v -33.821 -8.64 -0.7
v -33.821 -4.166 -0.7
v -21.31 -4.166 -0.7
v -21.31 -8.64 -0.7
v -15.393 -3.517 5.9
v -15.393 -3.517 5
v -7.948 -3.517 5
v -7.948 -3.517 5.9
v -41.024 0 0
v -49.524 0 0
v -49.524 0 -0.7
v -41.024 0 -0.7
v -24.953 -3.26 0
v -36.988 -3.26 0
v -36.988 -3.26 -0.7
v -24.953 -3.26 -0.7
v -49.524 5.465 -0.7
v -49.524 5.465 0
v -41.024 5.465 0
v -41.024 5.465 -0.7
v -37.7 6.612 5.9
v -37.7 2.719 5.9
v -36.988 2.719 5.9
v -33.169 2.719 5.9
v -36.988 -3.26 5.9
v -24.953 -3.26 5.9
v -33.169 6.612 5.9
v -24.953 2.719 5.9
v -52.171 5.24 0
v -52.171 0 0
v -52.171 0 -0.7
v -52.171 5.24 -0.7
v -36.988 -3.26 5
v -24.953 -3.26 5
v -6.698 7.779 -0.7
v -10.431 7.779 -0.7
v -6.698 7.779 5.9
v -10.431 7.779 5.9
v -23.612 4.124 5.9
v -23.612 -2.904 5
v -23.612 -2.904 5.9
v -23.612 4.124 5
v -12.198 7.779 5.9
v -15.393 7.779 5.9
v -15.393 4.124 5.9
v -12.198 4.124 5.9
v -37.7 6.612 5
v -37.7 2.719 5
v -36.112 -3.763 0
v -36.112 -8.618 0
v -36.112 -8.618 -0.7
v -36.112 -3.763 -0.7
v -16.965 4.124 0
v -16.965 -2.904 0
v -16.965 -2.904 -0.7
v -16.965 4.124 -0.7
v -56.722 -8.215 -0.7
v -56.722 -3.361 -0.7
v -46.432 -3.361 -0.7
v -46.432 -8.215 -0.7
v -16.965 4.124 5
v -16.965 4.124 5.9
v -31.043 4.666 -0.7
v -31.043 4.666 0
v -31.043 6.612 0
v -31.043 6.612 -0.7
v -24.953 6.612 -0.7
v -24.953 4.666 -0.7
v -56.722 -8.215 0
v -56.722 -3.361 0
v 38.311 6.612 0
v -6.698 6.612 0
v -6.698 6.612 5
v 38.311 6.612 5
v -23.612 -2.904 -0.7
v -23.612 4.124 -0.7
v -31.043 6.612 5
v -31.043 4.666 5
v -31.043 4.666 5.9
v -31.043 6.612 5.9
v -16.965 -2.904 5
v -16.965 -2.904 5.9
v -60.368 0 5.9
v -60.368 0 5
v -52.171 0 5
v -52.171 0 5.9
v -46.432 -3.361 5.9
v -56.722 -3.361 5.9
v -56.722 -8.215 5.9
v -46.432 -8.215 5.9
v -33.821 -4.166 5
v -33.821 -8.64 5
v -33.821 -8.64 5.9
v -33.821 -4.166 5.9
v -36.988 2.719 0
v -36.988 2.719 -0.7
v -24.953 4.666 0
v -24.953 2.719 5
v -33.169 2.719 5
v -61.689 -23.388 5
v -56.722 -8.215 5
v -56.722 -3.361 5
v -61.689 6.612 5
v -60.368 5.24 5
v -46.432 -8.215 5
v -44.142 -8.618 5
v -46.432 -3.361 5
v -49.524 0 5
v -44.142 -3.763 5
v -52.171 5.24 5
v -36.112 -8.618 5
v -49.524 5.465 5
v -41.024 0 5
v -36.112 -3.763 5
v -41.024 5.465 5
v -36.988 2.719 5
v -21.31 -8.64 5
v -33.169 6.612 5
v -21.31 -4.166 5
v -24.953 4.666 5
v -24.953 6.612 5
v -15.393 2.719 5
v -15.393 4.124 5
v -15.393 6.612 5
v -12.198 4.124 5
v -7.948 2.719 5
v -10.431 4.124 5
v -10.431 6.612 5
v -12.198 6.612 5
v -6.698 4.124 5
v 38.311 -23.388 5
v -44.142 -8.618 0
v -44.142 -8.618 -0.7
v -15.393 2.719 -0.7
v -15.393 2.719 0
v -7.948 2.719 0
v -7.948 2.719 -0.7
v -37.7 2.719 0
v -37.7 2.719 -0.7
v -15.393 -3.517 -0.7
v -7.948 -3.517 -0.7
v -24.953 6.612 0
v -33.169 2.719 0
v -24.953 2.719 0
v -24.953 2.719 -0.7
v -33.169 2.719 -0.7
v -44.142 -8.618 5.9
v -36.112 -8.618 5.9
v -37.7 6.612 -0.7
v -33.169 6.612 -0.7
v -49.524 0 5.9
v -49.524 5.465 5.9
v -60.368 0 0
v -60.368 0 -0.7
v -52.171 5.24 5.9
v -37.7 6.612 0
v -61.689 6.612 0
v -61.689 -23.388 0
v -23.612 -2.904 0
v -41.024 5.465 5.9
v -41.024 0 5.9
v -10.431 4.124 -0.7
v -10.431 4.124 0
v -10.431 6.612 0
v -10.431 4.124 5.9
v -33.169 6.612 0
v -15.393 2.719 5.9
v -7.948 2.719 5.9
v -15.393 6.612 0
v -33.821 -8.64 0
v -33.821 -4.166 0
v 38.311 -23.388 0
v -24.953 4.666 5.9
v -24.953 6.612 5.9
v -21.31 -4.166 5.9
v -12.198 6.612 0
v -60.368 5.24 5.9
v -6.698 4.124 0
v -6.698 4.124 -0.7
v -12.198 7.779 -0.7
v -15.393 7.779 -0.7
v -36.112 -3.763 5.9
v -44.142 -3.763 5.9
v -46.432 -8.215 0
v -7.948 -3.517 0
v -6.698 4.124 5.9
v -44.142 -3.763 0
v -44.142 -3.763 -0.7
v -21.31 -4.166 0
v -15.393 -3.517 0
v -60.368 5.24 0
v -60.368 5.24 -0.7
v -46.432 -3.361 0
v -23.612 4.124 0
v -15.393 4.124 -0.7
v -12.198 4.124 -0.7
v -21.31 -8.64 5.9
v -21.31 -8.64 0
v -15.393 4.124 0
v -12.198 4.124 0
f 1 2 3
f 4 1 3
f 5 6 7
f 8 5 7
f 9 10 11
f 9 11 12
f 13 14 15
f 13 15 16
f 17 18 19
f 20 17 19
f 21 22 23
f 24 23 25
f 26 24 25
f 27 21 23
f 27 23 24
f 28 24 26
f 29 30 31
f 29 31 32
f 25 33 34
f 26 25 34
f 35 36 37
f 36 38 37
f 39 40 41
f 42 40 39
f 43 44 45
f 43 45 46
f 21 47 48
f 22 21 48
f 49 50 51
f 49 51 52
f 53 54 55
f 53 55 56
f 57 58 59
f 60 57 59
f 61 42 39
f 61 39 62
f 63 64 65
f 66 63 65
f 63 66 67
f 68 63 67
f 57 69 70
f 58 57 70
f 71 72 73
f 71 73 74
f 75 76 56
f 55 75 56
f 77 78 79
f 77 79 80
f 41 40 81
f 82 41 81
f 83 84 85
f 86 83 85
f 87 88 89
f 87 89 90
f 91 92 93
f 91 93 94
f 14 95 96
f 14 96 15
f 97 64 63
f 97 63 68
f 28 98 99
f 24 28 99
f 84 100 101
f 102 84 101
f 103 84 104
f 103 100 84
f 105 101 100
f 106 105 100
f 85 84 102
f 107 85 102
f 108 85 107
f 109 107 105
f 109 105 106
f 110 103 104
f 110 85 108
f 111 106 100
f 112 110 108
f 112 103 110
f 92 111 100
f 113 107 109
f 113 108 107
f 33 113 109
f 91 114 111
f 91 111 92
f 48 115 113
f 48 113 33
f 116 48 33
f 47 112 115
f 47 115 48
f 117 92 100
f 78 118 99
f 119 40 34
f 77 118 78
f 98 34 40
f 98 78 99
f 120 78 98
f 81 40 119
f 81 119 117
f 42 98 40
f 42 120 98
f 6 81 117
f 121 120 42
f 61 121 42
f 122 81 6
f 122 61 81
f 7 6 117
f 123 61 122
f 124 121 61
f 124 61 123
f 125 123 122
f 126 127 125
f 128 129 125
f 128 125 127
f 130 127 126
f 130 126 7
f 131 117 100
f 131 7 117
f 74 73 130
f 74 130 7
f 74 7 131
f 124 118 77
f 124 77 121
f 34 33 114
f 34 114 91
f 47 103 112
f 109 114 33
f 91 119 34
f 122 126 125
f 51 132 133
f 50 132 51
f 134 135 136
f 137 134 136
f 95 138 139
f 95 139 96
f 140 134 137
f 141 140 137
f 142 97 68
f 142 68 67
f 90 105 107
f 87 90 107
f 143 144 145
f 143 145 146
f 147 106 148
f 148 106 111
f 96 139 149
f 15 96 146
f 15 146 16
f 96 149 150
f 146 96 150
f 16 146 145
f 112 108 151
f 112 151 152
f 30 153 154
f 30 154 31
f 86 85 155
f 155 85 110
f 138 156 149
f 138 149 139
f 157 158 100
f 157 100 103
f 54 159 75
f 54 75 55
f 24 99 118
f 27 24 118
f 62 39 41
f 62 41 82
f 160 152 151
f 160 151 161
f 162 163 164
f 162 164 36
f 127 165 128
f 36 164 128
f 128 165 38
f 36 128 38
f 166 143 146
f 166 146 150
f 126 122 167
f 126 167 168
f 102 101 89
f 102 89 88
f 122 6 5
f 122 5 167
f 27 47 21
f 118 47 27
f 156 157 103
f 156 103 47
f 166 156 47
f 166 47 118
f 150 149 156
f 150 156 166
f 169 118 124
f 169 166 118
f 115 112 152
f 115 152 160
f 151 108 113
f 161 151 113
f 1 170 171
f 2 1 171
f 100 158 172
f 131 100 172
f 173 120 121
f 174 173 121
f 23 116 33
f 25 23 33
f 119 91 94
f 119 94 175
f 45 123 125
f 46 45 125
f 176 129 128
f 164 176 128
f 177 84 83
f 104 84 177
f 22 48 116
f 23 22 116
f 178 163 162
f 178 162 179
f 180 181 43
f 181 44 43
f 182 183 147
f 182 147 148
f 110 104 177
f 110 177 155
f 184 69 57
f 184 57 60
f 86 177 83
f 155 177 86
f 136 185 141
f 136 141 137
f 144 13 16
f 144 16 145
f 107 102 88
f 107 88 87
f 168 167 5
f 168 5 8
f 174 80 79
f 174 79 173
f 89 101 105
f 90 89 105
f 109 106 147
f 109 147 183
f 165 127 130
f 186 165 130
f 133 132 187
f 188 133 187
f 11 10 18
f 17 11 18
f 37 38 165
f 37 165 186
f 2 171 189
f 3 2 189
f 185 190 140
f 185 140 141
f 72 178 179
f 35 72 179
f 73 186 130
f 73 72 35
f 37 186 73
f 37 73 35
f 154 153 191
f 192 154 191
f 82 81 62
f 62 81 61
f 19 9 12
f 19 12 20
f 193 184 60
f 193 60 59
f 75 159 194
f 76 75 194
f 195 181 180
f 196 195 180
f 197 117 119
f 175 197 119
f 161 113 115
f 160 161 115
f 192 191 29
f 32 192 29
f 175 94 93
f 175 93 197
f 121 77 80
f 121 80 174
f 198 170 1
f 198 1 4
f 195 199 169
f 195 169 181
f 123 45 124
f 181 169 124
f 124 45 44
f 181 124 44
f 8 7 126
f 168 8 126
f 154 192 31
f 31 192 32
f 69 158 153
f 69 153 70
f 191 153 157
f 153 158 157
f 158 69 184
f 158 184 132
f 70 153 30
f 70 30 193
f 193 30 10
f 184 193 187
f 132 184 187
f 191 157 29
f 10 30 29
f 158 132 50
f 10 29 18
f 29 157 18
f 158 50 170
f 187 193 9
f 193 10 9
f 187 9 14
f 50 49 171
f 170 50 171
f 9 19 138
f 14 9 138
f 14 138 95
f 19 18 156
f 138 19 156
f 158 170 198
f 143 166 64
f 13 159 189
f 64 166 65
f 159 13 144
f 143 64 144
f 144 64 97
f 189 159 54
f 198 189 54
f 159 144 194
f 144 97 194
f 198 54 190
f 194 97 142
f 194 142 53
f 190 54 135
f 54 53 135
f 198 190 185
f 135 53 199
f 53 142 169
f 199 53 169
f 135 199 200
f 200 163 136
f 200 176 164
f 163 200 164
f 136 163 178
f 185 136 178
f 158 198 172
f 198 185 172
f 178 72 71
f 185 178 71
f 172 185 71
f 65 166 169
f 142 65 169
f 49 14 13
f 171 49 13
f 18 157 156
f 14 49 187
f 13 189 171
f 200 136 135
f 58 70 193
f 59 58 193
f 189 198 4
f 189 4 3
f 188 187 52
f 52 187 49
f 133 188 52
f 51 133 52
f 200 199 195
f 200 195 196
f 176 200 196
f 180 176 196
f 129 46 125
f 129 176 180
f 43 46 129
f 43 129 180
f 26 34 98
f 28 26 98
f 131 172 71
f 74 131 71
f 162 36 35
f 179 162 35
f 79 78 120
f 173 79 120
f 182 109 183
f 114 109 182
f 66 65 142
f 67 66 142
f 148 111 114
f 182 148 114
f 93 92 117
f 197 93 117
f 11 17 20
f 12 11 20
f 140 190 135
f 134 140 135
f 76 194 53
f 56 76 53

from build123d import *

# Parameters (mm, degrees)
F0_W          = 100
F0_H          = 30
F1_DEPTH      = 5
F2_W          = 8.196883
F2_H          = 5.239555
F2_W_2        = 10.289293
F2_H_2        = 4.854159
F2_W_3        = 8.500245
F2_H_3        = 5.465182
F2_W_4        = 8.03056
F2_H_4        = 4.854797
F2_W_5        = 12.510864
F2_H_5        = 4.473866
F2_W_6        = 6.646618
F2_H_6        = 7.028431
F2_W_7        = 6.090546
F2_H_7        = 1.946411
F2_W_8        = 7.445213
F2_H_8        = 6.23659
F2_W_9        = 3.194372
F2_H_9        = 3.654776
F2_W_10       = 3.732365
F3_DEPTH      = 0.9
F3_DEPTH_BACK = 5.7


with BuildPart() as f1:
    # F0 (on Top) → F1 (new body)
    with BuildSketch(Plane.XY):
        with Locations((-11.689384, -8.387734)):
            Rectangle(F0_W, F0_H)
    extrude(amount=F1_DEPTH)

    # F2 (on face) → F3 (join, two sides)
    with BuildSketch(Plane.XY.offset(5)) as f3_sk:
        with Locations((-56.269321, 2.619778)):
            Rectangle(F2_W, F2_H)
        with Locations((-51.577137, -5.787824)):
            Rectangle(F2_W_2, F2_H_2)
        with Locations((-45.274136, 2.732591)):
            Rectangle(F2_W_3, F2_H_3)
        Polygon((-37.700053, 2.719443), (-36.987849, 2.719443), (-33.169098, 2.719443), (-33.169098, 6.612266), (-37.700053, 6.612266), align=None)
        Polygon((-33.169098, 2.719443), (-36.987849, 2.719443), (-36.987849, -3.260119), (-24.9527, -3.260119), (-24.9527, 2.719443), align=None)
        with Locations((-40.126903, -6.190432)):
            Rectangle(F2_W_4, F2_H_4)
        with Locations((-27.565886, -6.402896)):
            Rectangle(F2_W_5, F2_H_5)
        with Locations((-20.288212, 0.609834)):
            Rectangle(F2_W_6, F2_H_6)
        with Locations((-27.997973, 5.63906)):
            Rectangle(F2_W_7, F2_H_7)
        with Locations((-11.670222, -0.398852)):
            Rectangle(F2_W_8, F2_H_8)
        with Locations((-13.795643, 5.951438)):
            Rectangle(F2_W_9, F2_H_9)
        with Locations((-8.564607, 5.951438)):
            Rectangle(F2_W_10, F2_H_9)
    extrude(amount=F3_DEPTH)
    extrude(f3_sk.sketch, amount=-F3_DEPTH_BACK)


solid = f1.part
